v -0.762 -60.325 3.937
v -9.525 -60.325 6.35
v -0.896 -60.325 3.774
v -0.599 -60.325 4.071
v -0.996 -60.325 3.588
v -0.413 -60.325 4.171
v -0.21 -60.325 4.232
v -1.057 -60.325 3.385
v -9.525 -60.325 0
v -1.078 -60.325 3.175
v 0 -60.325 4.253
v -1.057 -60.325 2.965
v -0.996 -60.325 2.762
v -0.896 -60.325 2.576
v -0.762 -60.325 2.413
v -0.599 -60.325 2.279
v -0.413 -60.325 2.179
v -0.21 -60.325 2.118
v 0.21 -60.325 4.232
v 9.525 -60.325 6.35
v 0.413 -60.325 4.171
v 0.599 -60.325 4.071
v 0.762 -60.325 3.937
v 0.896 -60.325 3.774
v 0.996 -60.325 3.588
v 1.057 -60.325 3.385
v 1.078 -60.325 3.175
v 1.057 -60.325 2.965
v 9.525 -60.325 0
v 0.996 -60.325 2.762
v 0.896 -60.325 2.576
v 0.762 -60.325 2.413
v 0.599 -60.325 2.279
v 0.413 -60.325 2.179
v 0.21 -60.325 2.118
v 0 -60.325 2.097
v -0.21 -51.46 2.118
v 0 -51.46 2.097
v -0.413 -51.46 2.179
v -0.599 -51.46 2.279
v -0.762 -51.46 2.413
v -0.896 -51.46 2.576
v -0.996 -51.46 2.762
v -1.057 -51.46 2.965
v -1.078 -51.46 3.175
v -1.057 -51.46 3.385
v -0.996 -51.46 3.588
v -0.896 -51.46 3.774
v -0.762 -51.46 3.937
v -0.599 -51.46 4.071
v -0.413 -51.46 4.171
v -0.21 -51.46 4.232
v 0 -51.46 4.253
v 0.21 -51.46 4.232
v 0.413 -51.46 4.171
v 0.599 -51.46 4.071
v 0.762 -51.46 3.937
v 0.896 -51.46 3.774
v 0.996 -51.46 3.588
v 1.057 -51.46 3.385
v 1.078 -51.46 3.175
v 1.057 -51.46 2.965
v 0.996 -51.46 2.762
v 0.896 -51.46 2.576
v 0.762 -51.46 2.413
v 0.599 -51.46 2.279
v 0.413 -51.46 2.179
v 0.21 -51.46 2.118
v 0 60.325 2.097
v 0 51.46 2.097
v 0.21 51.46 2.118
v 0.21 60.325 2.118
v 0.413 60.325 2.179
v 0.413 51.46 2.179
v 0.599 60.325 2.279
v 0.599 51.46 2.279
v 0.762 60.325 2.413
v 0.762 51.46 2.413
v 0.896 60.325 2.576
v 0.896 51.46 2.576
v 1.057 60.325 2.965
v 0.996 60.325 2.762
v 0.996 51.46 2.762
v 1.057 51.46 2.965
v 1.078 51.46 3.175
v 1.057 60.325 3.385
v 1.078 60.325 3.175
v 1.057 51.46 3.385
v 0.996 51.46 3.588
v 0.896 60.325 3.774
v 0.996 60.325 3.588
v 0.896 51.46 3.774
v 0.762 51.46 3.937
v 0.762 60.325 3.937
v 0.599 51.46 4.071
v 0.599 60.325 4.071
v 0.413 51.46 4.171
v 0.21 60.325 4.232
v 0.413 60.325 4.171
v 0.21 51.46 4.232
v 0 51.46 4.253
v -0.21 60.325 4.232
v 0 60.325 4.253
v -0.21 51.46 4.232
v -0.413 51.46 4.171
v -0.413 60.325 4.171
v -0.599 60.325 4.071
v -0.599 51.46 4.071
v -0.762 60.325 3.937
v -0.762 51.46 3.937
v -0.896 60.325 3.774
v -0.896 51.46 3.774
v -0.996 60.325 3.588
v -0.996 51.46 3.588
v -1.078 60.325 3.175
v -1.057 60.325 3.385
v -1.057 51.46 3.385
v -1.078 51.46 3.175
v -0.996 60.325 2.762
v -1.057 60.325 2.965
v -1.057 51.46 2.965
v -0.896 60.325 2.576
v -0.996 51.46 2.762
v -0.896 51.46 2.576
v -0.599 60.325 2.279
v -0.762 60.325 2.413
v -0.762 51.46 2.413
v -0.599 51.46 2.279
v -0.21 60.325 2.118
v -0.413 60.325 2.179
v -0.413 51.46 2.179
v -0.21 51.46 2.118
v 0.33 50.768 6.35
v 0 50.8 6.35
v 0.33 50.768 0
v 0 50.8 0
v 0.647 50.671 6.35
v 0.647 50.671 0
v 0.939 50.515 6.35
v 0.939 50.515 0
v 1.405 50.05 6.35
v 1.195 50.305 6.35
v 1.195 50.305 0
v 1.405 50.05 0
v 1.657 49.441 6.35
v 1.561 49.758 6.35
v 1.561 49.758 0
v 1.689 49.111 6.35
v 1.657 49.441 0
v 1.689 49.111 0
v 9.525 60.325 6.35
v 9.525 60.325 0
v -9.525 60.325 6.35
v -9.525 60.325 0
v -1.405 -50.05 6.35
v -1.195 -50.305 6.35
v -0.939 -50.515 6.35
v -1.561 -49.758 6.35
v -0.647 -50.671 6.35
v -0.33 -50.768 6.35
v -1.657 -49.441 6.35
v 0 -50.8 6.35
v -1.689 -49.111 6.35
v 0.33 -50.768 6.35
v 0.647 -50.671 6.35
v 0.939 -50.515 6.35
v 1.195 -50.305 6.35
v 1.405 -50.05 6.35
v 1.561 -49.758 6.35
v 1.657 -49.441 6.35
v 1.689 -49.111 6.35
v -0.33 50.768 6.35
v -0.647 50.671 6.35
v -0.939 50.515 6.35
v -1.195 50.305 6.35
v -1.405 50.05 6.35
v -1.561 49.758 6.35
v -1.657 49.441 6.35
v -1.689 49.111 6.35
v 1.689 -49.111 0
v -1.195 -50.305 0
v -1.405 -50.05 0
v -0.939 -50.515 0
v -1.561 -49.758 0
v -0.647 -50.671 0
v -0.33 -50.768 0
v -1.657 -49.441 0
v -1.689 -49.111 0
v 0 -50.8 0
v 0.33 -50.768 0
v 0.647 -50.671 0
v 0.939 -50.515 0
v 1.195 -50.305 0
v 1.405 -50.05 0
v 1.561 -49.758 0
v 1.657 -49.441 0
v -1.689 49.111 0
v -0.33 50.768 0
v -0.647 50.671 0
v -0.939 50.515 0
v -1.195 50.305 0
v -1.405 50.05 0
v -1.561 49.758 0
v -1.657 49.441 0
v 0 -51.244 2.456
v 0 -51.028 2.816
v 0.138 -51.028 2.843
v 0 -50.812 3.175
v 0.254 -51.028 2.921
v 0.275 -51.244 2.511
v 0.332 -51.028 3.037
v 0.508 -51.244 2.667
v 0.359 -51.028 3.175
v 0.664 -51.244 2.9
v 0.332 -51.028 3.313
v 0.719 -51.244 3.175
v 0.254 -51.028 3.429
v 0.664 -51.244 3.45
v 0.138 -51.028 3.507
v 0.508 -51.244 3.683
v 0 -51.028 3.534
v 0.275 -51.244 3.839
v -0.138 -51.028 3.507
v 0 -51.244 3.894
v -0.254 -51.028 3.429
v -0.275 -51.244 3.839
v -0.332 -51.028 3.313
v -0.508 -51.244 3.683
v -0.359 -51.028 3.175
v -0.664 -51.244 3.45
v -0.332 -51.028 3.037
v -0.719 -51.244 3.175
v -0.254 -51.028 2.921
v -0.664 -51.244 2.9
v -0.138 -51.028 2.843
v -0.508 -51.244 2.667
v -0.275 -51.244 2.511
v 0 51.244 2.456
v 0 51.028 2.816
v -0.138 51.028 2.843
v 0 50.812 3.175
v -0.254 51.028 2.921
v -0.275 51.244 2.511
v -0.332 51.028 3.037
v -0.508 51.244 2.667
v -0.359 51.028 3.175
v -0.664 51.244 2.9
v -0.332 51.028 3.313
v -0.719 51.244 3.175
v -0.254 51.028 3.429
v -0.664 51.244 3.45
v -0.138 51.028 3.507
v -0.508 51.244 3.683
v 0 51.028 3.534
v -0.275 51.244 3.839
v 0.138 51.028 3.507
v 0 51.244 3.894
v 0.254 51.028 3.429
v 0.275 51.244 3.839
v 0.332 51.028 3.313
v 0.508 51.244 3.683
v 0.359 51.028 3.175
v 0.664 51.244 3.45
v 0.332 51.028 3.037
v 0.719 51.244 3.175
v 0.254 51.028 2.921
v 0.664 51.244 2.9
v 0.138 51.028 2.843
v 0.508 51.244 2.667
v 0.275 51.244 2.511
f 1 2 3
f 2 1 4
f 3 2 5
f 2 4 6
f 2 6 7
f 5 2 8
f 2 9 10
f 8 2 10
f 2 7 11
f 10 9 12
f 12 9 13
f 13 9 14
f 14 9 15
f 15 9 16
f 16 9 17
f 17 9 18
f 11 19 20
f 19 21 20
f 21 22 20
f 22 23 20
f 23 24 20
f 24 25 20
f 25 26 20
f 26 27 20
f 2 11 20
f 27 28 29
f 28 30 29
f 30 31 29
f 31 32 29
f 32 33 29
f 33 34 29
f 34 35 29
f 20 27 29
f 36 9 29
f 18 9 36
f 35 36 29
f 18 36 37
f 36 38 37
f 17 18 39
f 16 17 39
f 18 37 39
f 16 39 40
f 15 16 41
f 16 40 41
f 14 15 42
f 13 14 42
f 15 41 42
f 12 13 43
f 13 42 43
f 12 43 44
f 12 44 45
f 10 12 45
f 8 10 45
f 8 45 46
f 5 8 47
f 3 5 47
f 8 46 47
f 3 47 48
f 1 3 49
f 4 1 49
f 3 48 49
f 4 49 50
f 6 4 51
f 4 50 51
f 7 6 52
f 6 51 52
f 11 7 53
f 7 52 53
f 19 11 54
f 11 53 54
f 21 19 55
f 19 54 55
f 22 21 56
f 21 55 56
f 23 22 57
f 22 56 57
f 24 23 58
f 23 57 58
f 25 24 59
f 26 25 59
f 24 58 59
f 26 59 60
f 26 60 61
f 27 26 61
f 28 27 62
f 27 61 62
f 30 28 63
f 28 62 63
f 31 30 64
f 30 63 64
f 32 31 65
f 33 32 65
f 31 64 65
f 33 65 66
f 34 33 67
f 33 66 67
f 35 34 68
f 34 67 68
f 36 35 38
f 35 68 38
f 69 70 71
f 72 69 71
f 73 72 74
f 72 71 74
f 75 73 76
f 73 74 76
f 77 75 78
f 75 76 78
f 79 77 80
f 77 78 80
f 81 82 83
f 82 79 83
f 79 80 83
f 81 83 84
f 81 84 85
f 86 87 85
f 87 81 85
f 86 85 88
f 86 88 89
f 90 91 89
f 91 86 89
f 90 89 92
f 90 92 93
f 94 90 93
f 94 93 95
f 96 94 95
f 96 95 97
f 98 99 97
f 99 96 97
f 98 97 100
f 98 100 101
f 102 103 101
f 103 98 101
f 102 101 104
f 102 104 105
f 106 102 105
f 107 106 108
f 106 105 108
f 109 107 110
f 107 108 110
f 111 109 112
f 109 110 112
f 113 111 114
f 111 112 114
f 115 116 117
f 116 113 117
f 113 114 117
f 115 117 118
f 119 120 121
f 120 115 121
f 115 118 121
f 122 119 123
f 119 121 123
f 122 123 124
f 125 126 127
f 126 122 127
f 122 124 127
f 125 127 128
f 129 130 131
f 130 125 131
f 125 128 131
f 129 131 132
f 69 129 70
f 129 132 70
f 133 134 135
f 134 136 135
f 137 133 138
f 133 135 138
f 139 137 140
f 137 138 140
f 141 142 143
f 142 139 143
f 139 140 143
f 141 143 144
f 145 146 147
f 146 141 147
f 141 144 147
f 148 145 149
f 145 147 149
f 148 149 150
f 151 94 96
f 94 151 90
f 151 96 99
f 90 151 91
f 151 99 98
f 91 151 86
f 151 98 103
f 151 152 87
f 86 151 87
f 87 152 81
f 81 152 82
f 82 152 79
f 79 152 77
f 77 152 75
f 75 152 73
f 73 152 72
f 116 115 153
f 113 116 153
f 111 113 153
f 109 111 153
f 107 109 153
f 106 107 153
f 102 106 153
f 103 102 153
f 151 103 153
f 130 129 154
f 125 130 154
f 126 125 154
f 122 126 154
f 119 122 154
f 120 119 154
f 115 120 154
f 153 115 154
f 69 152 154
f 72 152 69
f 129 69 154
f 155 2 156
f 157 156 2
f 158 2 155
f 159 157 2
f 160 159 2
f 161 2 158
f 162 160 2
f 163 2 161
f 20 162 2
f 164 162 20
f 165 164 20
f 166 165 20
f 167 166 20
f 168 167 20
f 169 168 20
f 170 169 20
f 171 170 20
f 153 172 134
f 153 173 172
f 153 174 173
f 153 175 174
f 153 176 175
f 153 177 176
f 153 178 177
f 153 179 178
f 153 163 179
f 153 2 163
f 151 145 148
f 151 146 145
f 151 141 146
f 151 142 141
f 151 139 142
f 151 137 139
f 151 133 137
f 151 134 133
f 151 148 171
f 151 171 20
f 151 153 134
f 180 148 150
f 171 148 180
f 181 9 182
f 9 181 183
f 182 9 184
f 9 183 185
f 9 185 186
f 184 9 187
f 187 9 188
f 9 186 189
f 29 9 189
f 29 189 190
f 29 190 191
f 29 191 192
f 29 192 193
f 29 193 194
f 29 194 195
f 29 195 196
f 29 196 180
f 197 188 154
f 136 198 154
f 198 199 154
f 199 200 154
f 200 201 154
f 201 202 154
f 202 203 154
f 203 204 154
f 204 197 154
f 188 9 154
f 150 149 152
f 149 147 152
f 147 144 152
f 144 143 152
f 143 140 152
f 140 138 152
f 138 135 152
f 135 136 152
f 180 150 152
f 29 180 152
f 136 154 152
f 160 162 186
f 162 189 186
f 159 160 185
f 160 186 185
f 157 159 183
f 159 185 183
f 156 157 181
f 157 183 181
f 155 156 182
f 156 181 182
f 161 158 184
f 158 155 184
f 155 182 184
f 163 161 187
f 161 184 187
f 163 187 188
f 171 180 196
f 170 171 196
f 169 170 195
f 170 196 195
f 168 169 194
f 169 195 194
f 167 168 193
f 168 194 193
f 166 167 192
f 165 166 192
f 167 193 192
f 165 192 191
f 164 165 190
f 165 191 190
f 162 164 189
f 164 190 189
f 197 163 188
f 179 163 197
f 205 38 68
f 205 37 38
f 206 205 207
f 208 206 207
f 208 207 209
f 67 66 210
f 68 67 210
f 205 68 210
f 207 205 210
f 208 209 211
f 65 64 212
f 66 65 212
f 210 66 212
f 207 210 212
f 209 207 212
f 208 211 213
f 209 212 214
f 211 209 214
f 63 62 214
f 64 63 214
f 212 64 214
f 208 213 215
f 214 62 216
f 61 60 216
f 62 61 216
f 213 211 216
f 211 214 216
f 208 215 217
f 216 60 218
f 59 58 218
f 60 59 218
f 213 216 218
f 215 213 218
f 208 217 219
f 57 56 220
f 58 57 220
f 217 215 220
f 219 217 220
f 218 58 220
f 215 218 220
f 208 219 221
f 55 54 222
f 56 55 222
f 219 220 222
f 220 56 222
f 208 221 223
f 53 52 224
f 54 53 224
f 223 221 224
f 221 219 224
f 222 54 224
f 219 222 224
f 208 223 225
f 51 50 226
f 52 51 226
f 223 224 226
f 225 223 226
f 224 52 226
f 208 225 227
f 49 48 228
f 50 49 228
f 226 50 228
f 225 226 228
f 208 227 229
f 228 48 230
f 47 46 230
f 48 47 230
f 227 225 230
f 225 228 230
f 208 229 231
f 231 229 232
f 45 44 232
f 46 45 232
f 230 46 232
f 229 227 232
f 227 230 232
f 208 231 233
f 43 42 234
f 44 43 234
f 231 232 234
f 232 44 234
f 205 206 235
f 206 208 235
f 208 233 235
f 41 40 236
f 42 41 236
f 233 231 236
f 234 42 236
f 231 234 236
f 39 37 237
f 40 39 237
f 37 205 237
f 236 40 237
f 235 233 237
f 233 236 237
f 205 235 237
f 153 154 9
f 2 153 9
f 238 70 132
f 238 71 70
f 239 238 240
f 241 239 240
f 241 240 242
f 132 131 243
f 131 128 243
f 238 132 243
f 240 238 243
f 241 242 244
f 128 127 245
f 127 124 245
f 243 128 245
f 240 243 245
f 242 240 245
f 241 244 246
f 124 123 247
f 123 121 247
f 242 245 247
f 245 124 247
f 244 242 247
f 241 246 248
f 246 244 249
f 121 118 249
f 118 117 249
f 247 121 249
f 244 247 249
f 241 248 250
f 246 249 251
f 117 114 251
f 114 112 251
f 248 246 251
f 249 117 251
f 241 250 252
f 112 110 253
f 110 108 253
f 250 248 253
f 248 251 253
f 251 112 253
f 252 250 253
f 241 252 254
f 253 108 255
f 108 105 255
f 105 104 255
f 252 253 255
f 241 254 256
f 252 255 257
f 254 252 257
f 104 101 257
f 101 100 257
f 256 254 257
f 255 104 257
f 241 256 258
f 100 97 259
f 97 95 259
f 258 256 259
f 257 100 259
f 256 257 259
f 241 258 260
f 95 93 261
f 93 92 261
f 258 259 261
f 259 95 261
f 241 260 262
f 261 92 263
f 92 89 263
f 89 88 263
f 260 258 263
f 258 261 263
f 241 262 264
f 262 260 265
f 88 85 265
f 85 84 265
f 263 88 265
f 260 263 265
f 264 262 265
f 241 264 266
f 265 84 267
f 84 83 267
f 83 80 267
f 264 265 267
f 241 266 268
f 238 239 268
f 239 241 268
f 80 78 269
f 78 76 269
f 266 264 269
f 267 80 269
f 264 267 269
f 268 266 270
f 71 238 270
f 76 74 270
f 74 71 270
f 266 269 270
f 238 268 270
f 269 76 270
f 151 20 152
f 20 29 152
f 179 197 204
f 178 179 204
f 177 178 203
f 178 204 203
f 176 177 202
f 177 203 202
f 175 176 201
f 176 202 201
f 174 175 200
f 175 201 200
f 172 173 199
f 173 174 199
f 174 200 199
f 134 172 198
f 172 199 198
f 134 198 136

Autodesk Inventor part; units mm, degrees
ref_plane "YZ Plane" through (0, 0, 0) normal (1, 0, 0) x (0, 1, 0)
ref_plane "XZ Plane" through (0, 0, 0) normal (0, 1, 0) x (-1, 0, 0)
ref_plane "XY Plane" through (0, 0, 0) normal (0, 0, 1) x (1, 0, 0)
sketch "Sketch1" plane through (0, 0, 0) normal (0, 0, 1) x (1, 0, 0)
  line L0 (-9.525, -60.325) -> (9.525, -60.325)
  line L1 (9.525, -60.325) -> (9.525, 60.325)
  line L2 (9.525, 60.325) -> (-9.525, 60.325)
  line L3 (-9.525, 60.325) -> (-9.525, -60.325)
  line L4 (-9.525, -60.325) -> (9.525, 60.325) construction
  line L5 (9.525, -60.325) -> (-9.525, 60.325) construction
  point P0 (0, 0)
  dimension "d0" = 19.05
  dimension "d1" = 120.65
extrude "Extrusion1" add sketch "Sketch1" along normal blind 6.35
sketch "Sketch2" plane through (0, 0, 6.35) normal (0, 0, 1) x (1, 0, 0)
  line L0 (1.6891, -50.8) -> (-1.6891, -50.8)
  line L1 (-1.6891, -50.8) -> (-1.6891, 50.8)
  line L2 (-1.6891, 50.8) -> (1.6891, 50.8)
  line L3 (1.6891, 50.8) -> (1.6891, -50.8)
  line L4 (1.6891, -50.8) -> (-1.6891, 50.8) construction
  line L5 (-1.6891, -50.8) -> (1.6891, 50.8) construction
  point P0 (0, 0)
  dimension "d4" = 3.3782
  dimension "d5" = 101.6
extrude "Extrusion2" cut sketch "Sketch2" against normal through all
fillet "Fillet1" radius 1.6891 4 edges at (-1.6891, -50.8, 3.175) (1.6891, -50.8, 3.175) (-1.6891, 50.8, 3.175) (1.6891, 50.8, 3.175)
sketch "Sketch4" plane through (-9.525, -60.325, 0) normal (0, -1, 0) x (1, 0, 0)
  line L0 (0, 0) -> (19.05, 0) projected
  line L1 (19.05, 0) -> (19.05, 6.35) projected
  line L2 (0, 6.35) -> (19.05, 6.35) projected
  line L3 (0, 0) -> (0, 6.35) projected
  point P0 (9.525, 0)
  point P1 (9.525, 3.175)
  dimension "d16" = 3.175
  dimension "d17" = 9.525
hole "Hole2" at (0, -60.325, 3.175) direction (0, 1, 0) diameter 2.156 depth 8.865 tip angle 118 thread size "4-40 UNC" class "2B" standard "ANSI Unified Screw Threads"
mirror "Mirror1" about plane through (0, 0, 0) normal (0, 1, 0) of "Hole2"
equation "\"d0\" = sensorHolderDepth"
equation "\"d1\" = -internalAcrylicThickness + height"
equation "\"d2\" = acrylicThickness"
equation "\"d5\" = height - 4 * acrylicThickness"
equation "\"d6\" = acrylicThickness"
equation "\"d16\" = 0.5 * internalAcrylicThickness"
equation "\"d17\" = 0.5 * sensorHolderDepth"
equation "\"acrylicThickness\" = 6.35"
equation "\"height\" = 127"
equation "\"sensorHolderDepth\" = 19.05"
equation "\"frameAcrylicThickness\" = 9.525"
equation "\"internalAcrylicThicnkess\" = 6.35"
equation "\"width\" = 127"
equation "\"depth\" = 273.05"
equation "\"mirrorAngle\" = 5deg"
equation "\"detectorWidth\" = 52"
equation "\"detectorHeight\" = 52"
equation "\"mirrorThickness\" = 3.175"
equation "\"fresnelThickness\" = 0.1"
equation "\"focalLength\" = 76.2"
equation "\"ior\" = 1.49"
equation "\"centerThickness\" = 1.524"
equation "\"fresnelAngle\" = 90deg"
equation "\"fresnelEffectiveDiameter\" = 152.4"
equation "\"oRingWidth\" = 1.5875"
equation "\"internalAcrylicThickness\" = 6.35"
equation "\"aerogelClearence\" = 3.175"
equation "\"backplaneHoleOffsett\" = 6.35"
equation "\"backplanePCBHeight\" = 76.2"
equation "\"backplanePCBWidth\" = 76.2"
equation "\"backplanePostionOffsett\" = 12.7"
equation "\"moduleSlotClearence\" = 0.79375"
properties part number "verticalSupourt" material "ABS Plastic"
